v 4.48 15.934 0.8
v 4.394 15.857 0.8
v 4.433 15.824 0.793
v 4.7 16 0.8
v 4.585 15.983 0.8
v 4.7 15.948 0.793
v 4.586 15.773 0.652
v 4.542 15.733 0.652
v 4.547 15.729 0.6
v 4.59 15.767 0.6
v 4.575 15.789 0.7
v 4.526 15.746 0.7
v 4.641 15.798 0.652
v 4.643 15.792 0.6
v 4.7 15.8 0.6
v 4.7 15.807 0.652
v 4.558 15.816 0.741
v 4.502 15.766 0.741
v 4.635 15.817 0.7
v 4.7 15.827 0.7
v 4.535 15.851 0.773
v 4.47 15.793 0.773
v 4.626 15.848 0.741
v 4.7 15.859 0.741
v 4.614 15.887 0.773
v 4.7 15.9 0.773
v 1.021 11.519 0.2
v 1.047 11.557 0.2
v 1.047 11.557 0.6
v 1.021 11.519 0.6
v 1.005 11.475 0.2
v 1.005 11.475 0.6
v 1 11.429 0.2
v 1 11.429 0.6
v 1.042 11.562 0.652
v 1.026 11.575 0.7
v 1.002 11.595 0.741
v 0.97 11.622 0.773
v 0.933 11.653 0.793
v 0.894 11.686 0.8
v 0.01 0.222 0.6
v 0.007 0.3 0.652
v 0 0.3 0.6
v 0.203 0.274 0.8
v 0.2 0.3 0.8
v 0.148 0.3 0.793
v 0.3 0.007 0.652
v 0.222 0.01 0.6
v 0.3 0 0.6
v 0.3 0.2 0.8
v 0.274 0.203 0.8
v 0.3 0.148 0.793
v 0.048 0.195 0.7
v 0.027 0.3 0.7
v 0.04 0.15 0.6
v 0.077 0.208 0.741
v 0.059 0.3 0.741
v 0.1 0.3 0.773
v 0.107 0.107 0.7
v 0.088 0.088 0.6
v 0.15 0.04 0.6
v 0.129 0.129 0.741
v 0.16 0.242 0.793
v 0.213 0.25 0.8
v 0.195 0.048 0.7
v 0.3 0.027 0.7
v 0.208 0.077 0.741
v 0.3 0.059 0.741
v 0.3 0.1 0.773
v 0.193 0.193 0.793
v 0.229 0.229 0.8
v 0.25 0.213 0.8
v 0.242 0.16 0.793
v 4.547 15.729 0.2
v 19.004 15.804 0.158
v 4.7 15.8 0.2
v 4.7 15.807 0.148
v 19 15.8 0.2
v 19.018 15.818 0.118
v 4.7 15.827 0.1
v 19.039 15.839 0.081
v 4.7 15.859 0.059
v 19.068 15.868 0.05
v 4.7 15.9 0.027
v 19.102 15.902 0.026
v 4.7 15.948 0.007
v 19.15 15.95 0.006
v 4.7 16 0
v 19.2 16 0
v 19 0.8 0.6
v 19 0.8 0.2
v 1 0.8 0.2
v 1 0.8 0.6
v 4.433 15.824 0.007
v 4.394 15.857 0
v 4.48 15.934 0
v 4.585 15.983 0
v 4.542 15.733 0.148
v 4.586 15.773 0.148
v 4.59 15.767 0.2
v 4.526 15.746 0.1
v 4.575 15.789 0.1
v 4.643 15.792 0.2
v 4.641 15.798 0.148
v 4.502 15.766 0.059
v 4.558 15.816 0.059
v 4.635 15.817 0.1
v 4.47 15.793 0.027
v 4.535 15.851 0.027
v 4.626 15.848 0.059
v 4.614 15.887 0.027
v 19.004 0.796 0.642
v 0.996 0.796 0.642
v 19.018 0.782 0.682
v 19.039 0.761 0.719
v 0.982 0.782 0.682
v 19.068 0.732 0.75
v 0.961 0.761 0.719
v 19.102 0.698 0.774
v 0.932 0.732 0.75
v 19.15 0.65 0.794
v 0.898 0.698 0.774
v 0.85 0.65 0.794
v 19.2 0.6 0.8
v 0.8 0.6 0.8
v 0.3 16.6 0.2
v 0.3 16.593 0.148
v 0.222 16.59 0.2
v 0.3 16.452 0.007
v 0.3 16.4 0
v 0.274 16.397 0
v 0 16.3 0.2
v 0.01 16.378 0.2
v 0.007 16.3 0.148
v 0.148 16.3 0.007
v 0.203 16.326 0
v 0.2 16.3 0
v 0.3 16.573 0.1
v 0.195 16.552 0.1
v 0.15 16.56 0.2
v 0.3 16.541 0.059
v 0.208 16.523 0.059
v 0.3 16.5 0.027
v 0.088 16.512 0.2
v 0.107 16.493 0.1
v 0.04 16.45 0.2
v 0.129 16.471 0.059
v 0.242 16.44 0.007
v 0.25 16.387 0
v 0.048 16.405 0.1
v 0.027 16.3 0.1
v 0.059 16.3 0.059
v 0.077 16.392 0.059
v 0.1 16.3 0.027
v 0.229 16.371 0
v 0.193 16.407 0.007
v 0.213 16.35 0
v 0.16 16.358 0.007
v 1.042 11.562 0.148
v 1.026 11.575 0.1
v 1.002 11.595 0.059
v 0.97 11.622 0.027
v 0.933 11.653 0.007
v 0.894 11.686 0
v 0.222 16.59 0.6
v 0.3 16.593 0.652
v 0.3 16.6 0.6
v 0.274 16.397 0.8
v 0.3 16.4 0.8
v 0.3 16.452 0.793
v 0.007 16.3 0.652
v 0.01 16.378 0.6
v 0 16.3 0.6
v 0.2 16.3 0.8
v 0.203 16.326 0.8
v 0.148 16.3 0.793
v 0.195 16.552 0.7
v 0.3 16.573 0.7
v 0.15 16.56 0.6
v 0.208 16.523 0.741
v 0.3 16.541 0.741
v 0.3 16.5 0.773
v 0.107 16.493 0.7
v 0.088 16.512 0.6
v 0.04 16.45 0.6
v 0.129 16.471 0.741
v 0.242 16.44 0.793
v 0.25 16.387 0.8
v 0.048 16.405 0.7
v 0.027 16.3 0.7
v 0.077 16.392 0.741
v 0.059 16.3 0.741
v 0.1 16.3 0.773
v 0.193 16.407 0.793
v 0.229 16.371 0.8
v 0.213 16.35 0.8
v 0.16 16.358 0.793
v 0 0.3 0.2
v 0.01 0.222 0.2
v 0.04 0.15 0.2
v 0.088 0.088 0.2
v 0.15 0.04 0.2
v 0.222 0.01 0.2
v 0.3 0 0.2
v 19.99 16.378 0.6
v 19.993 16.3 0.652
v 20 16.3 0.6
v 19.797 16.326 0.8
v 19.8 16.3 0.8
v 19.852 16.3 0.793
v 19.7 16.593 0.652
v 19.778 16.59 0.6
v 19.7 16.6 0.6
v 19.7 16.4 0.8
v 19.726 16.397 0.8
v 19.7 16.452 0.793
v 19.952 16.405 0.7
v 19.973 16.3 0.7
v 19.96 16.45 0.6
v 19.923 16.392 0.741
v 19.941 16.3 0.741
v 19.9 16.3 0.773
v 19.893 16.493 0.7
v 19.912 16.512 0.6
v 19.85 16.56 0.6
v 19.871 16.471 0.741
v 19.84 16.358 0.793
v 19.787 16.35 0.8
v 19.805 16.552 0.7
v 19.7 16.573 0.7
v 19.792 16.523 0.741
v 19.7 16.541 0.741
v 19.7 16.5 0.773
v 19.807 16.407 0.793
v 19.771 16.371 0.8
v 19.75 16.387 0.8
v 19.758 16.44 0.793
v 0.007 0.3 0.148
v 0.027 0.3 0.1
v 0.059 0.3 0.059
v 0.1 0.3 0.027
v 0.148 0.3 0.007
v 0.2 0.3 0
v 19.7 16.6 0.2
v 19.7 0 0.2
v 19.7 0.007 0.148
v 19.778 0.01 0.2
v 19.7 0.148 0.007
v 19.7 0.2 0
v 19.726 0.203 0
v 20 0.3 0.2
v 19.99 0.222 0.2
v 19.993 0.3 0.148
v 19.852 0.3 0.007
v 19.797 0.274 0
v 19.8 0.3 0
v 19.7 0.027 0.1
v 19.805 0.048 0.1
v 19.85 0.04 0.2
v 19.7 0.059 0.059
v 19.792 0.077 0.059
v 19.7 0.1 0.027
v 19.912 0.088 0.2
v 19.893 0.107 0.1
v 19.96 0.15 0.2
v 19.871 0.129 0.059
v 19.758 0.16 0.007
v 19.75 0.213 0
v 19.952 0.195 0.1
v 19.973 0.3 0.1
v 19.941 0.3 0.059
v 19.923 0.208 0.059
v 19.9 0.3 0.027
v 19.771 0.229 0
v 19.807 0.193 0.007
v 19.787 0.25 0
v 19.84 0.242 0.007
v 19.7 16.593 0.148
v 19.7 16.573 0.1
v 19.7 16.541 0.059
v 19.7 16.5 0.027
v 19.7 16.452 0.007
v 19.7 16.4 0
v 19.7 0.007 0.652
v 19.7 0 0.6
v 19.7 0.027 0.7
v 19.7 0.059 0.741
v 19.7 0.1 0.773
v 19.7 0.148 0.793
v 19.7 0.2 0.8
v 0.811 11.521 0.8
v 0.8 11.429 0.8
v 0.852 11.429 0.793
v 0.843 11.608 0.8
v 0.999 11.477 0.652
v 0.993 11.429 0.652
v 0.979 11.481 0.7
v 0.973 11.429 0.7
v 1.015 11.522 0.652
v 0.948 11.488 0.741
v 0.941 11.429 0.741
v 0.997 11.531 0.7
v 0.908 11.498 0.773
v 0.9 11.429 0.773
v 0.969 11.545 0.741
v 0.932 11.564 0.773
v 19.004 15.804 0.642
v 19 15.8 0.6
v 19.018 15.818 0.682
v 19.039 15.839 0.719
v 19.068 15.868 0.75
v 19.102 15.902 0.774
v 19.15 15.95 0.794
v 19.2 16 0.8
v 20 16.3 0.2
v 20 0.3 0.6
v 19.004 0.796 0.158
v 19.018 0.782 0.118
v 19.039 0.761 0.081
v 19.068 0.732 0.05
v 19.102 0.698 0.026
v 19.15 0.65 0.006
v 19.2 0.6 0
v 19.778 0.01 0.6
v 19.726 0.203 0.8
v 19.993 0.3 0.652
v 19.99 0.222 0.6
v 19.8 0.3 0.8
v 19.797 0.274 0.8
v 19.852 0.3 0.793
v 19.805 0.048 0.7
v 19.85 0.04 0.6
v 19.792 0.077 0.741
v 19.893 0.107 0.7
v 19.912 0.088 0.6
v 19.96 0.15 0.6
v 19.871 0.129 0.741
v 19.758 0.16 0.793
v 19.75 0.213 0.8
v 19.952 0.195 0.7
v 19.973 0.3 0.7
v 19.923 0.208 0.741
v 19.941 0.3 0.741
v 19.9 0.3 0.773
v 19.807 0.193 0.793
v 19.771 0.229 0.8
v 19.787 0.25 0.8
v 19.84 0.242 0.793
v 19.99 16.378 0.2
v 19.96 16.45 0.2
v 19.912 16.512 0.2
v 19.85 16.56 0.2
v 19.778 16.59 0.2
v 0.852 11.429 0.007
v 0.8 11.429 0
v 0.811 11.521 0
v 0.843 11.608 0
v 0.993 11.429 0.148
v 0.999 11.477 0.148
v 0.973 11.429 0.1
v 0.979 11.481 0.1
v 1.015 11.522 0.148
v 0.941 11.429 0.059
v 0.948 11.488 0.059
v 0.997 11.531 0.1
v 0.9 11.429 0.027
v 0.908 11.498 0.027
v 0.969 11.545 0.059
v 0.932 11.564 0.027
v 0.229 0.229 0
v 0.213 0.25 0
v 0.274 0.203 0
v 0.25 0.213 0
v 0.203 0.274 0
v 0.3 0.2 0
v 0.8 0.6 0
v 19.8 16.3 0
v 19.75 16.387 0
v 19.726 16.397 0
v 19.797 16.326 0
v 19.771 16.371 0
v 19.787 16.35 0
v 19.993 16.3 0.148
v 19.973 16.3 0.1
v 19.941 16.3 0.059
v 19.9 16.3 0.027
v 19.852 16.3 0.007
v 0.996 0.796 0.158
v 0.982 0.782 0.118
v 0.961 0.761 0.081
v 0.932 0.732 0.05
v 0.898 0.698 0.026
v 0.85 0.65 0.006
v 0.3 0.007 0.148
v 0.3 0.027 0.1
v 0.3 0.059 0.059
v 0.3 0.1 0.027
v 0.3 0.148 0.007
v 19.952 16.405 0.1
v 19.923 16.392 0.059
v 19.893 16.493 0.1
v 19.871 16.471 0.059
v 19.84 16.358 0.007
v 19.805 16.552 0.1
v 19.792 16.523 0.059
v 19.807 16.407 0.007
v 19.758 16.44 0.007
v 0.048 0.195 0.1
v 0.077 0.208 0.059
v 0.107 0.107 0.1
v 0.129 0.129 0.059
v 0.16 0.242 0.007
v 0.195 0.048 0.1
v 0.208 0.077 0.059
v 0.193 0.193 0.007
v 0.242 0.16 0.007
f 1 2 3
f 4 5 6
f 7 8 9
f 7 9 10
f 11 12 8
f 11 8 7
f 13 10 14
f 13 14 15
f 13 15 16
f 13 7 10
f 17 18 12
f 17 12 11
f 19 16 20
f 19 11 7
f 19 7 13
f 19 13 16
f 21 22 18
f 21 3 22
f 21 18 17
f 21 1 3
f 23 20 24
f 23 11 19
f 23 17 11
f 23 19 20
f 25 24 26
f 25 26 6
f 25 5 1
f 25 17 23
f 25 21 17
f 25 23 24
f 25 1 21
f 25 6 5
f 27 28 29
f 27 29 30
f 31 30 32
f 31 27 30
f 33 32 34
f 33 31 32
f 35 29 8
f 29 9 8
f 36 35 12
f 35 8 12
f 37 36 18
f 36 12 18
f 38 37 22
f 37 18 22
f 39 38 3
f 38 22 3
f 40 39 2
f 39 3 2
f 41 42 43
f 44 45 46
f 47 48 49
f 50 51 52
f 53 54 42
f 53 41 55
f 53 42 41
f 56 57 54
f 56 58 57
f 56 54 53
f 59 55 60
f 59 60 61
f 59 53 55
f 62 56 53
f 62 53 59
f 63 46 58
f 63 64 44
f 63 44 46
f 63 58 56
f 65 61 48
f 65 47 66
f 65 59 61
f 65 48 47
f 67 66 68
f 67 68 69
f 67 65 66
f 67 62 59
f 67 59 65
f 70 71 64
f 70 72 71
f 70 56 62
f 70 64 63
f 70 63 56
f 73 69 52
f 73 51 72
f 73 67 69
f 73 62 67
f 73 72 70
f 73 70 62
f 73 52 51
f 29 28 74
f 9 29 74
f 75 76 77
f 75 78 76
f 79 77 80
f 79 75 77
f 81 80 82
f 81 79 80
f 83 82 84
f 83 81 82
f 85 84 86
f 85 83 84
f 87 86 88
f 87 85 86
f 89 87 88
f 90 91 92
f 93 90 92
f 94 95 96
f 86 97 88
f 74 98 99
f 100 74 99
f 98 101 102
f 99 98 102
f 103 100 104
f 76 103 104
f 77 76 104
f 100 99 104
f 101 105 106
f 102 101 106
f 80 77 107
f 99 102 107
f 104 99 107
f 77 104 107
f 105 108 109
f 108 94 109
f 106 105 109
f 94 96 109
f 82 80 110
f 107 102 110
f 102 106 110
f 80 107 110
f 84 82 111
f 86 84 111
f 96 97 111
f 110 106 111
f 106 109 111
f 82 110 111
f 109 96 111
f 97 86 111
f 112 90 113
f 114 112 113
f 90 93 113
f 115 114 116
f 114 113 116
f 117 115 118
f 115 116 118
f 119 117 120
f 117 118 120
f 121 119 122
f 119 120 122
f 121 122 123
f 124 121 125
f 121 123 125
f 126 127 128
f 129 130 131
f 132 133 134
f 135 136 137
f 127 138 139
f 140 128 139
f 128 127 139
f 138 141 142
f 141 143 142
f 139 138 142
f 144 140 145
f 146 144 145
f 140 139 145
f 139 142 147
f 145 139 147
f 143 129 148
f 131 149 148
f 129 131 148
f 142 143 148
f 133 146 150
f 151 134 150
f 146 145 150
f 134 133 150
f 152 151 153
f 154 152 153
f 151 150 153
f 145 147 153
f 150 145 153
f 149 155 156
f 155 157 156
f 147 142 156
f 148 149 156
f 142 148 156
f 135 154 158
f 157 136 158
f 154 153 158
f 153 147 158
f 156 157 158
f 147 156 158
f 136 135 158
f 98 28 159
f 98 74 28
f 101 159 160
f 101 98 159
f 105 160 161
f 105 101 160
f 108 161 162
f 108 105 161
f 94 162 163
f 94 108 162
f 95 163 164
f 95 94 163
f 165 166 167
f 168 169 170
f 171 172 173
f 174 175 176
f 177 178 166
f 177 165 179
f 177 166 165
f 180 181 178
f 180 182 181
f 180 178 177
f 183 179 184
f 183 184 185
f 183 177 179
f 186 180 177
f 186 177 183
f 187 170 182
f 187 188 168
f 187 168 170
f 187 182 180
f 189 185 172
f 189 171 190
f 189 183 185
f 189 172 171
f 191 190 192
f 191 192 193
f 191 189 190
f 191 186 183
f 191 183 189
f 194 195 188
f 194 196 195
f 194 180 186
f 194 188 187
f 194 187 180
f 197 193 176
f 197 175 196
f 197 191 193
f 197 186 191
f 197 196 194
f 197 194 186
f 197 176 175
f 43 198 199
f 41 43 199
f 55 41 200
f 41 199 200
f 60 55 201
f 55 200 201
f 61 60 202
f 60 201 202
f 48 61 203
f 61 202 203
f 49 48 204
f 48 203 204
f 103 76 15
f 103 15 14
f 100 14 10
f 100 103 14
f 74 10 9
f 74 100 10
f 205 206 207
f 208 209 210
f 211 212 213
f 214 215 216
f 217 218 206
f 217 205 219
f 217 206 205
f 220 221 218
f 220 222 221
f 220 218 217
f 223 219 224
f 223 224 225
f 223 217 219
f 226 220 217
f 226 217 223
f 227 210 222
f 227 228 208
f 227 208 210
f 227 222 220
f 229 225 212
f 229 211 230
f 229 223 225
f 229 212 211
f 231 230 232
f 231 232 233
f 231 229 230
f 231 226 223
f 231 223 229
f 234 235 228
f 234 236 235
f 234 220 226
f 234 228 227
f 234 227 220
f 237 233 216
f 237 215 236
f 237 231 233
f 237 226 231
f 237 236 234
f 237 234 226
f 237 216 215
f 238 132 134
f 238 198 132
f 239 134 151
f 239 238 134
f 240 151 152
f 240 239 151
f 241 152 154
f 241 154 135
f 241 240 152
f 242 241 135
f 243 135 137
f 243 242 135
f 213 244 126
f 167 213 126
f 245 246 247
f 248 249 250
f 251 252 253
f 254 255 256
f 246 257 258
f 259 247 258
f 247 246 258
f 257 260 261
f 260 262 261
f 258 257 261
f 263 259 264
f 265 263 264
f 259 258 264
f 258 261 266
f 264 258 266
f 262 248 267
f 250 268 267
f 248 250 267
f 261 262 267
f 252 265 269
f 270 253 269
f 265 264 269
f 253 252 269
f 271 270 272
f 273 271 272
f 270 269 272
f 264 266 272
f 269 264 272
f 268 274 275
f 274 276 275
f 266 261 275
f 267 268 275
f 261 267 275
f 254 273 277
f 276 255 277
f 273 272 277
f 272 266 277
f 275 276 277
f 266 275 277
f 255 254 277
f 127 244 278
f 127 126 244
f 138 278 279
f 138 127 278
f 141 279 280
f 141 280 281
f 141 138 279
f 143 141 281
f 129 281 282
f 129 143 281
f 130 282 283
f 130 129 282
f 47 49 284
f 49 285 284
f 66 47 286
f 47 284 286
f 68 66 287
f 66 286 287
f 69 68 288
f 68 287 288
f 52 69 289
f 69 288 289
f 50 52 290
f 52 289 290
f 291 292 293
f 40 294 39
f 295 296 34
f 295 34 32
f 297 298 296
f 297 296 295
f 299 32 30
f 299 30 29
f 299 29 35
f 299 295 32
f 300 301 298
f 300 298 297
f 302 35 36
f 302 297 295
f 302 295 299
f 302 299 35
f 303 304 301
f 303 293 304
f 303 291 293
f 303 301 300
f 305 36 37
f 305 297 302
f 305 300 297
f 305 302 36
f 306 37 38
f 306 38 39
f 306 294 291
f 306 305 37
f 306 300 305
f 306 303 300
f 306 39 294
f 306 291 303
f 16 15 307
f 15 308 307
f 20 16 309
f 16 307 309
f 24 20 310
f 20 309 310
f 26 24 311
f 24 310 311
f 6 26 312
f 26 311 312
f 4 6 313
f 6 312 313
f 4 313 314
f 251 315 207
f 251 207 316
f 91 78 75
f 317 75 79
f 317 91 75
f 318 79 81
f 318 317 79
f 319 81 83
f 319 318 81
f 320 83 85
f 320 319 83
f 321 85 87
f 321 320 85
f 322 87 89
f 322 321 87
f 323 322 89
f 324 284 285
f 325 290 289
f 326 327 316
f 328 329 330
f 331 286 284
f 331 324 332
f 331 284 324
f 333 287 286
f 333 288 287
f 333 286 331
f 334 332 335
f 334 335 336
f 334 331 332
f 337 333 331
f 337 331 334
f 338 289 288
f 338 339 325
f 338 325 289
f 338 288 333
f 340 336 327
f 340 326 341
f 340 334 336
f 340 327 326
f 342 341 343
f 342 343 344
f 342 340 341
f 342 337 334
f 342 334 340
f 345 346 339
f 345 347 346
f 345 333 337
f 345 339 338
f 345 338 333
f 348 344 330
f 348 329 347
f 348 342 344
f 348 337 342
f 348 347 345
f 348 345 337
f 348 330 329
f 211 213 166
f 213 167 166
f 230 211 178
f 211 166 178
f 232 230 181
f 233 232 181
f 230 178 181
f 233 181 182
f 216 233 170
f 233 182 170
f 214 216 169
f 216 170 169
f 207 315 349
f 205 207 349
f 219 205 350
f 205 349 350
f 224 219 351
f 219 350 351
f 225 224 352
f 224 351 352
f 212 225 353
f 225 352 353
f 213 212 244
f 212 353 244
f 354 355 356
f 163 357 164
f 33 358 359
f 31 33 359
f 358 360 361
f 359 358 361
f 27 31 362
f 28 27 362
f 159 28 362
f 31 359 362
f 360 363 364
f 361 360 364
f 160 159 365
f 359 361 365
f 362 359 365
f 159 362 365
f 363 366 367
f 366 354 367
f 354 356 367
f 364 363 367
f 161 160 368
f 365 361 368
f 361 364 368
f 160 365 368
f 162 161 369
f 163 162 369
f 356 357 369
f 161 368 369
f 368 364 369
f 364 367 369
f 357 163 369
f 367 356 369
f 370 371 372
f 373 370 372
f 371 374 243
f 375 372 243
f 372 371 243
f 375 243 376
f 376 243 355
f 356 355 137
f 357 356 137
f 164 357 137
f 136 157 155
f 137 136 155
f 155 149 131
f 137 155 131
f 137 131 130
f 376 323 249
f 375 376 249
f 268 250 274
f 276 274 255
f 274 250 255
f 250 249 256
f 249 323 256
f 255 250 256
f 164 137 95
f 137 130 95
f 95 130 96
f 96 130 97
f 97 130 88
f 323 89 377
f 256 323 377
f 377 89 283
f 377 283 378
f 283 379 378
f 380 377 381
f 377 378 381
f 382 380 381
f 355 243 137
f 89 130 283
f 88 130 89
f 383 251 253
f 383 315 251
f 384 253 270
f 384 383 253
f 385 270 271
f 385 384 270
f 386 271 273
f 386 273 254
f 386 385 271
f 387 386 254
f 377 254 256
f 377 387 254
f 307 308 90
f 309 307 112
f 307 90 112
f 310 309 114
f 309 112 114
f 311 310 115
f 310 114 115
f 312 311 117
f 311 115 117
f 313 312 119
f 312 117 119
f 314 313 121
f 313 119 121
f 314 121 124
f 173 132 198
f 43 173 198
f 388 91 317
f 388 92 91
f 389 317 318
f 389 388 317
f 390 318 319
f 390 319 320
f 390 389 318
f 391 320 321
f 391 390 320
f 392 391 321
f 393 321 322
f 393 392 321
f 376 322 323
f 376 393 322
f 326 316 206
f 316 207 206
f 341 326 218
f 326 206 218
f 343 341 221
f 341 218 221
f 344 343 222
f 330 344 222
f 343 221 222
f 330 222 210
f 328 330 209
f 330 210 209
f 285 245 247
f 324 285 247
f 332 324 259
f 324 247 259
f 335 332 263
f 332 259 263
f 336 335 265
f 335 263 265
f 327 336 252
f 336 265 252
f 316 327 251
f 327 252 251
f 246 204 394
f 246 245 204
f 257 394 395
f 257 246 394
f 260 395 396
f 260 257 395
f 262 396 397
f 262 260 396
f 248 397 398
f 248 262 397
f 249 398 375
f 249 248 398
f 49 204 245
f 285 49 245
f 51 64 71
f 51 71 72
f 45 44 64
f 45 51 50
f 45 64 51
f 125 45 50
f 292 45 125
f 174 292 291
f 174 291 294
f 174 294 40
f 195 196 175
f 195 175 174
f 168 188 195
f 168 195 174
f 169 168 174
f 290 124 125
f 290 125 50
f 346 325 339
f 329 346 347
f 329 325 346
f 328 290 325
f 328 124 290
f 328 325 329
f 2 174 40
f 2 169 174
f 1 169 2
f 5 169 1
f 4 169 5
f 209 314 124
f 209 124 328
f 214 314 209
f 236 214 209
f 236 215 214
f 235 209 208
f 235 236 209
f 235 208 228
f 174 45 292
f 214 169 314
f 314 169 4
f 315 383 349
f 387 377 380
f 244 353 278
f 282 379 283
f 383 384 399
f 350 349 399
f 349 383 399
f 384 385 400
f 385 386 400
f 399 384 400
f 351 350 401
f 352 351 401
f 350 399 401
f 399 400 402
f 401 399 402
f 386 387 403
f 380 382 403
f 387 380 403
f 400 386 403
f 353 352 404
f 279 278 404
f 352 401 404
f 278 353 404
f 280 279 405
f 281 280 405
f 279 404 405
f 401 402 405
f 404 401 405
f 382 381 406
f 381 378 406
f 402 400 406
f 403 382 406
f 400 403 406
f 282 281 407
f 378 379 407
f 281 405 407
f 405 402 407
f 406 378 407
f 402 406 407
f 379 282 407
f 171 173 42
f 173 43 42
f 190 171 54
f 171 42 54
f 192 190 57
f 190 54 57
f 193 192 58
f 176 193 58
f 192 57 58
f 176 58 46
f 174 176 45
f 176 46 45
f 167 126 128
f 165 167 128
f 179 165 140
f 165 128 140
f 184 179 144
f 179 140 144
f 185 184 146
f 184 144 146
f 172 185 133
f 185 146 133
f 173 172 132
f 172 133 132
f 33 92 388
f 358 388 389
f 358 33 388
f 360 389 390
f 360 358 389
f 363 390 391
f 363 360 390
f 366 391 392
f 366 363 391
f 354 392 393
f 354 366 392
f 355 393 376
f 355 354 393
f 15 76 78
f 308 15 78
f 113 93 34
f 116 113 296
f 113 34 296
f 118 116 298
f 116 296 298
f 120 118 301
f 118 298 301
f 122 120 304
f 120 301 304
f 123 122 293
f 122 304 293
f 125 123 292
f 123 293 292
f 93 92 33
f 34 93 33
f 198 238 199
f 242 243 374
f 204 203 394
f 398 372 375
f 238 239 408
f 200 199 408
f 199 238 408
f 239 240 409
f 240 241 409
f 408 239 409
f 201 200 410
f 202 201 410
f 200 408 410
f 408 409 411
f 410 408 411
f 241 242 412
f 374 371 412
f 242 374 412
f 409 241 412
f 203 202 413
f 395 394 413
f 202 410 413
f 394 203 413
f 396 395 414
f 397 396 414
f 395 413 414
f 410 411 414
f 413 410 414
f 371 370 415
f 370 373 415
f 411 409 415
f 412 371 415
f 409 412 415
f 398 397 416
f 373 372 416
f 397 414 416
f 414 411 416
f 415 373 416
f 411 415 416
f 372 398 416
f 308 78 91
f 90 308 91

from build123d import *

# Parameters (mm, degrees)
PAD_DEPTH = 0.8
FILLET_R  = 0.2


with BuildPart() as part:
    # Sketch → Pad (new body)
    with BuildSketch(Plane.XY):
        with BuildLine():
            Line((0.3, 0), (19.7, 0))
            ThreePointArc((19.7, 0), (19.912132, 0.087868), (20, 0.3))
            Line((20, 16.3), (20, 0.3))
            ThreePointArc((20, 16.3), (19.912132, 16.512132), (19.7, 16.6))
            Line((19.7, 16.6), (0.3, 16.6))
            ThreePointArc((0.3, 16.6), (0.087868, 16.512132), (0, 16.3))
            Line((0, 16.3), (0, 0.3))
            ThreePointArc((0, 0.3), (0.087868, 0.087868), (0.3, 0))
        make_face()
        with BuildLine():
            Line((19, 15.8), (19, 0.8))
            Line((19, 0.8), (1, 0.8))
            Line((1, 0.8), (1, 11.428862))
            ThreePointArc((1.046791, 11.55742), (1.012061, 11.497266), (1, 11.428862))
            Line((1.046791, 11.55742), (4.546791, 15.728558))
            ThreePointArc((4.7, 15.8), (4.615476, 15.781262), (4.546791, 15.728558))
            Line((4.7, 15.8), (19, 15.8))
        make_face(mode=Mode.SUBTRACT)
    extrude(amount=PAD_DEPTH)

    # Fillet
    fillet_edges = [part.edges().sort_by_distance(p)[0] for p in [
        (0, 8.3, 0.8),
        (0, 8.3, 0),
        (1, 6.114431, 0),
        (19, 8.3, 0),
        (10, 0.8, 0),
        (11.85, 15.8, 0),
        (2.796791, 13.642989, 0),
        (2.796791, 13.642989, 0.8),
        (1, 6.114431, 0.8),
        (11.85, 15.8, 0.8),
        (19, 8.3, 0.8),
        (10, 0.8, 0.8),
    ]]
    fillet(fillet_edges, radius=FILLET_R)


solid = part.part
